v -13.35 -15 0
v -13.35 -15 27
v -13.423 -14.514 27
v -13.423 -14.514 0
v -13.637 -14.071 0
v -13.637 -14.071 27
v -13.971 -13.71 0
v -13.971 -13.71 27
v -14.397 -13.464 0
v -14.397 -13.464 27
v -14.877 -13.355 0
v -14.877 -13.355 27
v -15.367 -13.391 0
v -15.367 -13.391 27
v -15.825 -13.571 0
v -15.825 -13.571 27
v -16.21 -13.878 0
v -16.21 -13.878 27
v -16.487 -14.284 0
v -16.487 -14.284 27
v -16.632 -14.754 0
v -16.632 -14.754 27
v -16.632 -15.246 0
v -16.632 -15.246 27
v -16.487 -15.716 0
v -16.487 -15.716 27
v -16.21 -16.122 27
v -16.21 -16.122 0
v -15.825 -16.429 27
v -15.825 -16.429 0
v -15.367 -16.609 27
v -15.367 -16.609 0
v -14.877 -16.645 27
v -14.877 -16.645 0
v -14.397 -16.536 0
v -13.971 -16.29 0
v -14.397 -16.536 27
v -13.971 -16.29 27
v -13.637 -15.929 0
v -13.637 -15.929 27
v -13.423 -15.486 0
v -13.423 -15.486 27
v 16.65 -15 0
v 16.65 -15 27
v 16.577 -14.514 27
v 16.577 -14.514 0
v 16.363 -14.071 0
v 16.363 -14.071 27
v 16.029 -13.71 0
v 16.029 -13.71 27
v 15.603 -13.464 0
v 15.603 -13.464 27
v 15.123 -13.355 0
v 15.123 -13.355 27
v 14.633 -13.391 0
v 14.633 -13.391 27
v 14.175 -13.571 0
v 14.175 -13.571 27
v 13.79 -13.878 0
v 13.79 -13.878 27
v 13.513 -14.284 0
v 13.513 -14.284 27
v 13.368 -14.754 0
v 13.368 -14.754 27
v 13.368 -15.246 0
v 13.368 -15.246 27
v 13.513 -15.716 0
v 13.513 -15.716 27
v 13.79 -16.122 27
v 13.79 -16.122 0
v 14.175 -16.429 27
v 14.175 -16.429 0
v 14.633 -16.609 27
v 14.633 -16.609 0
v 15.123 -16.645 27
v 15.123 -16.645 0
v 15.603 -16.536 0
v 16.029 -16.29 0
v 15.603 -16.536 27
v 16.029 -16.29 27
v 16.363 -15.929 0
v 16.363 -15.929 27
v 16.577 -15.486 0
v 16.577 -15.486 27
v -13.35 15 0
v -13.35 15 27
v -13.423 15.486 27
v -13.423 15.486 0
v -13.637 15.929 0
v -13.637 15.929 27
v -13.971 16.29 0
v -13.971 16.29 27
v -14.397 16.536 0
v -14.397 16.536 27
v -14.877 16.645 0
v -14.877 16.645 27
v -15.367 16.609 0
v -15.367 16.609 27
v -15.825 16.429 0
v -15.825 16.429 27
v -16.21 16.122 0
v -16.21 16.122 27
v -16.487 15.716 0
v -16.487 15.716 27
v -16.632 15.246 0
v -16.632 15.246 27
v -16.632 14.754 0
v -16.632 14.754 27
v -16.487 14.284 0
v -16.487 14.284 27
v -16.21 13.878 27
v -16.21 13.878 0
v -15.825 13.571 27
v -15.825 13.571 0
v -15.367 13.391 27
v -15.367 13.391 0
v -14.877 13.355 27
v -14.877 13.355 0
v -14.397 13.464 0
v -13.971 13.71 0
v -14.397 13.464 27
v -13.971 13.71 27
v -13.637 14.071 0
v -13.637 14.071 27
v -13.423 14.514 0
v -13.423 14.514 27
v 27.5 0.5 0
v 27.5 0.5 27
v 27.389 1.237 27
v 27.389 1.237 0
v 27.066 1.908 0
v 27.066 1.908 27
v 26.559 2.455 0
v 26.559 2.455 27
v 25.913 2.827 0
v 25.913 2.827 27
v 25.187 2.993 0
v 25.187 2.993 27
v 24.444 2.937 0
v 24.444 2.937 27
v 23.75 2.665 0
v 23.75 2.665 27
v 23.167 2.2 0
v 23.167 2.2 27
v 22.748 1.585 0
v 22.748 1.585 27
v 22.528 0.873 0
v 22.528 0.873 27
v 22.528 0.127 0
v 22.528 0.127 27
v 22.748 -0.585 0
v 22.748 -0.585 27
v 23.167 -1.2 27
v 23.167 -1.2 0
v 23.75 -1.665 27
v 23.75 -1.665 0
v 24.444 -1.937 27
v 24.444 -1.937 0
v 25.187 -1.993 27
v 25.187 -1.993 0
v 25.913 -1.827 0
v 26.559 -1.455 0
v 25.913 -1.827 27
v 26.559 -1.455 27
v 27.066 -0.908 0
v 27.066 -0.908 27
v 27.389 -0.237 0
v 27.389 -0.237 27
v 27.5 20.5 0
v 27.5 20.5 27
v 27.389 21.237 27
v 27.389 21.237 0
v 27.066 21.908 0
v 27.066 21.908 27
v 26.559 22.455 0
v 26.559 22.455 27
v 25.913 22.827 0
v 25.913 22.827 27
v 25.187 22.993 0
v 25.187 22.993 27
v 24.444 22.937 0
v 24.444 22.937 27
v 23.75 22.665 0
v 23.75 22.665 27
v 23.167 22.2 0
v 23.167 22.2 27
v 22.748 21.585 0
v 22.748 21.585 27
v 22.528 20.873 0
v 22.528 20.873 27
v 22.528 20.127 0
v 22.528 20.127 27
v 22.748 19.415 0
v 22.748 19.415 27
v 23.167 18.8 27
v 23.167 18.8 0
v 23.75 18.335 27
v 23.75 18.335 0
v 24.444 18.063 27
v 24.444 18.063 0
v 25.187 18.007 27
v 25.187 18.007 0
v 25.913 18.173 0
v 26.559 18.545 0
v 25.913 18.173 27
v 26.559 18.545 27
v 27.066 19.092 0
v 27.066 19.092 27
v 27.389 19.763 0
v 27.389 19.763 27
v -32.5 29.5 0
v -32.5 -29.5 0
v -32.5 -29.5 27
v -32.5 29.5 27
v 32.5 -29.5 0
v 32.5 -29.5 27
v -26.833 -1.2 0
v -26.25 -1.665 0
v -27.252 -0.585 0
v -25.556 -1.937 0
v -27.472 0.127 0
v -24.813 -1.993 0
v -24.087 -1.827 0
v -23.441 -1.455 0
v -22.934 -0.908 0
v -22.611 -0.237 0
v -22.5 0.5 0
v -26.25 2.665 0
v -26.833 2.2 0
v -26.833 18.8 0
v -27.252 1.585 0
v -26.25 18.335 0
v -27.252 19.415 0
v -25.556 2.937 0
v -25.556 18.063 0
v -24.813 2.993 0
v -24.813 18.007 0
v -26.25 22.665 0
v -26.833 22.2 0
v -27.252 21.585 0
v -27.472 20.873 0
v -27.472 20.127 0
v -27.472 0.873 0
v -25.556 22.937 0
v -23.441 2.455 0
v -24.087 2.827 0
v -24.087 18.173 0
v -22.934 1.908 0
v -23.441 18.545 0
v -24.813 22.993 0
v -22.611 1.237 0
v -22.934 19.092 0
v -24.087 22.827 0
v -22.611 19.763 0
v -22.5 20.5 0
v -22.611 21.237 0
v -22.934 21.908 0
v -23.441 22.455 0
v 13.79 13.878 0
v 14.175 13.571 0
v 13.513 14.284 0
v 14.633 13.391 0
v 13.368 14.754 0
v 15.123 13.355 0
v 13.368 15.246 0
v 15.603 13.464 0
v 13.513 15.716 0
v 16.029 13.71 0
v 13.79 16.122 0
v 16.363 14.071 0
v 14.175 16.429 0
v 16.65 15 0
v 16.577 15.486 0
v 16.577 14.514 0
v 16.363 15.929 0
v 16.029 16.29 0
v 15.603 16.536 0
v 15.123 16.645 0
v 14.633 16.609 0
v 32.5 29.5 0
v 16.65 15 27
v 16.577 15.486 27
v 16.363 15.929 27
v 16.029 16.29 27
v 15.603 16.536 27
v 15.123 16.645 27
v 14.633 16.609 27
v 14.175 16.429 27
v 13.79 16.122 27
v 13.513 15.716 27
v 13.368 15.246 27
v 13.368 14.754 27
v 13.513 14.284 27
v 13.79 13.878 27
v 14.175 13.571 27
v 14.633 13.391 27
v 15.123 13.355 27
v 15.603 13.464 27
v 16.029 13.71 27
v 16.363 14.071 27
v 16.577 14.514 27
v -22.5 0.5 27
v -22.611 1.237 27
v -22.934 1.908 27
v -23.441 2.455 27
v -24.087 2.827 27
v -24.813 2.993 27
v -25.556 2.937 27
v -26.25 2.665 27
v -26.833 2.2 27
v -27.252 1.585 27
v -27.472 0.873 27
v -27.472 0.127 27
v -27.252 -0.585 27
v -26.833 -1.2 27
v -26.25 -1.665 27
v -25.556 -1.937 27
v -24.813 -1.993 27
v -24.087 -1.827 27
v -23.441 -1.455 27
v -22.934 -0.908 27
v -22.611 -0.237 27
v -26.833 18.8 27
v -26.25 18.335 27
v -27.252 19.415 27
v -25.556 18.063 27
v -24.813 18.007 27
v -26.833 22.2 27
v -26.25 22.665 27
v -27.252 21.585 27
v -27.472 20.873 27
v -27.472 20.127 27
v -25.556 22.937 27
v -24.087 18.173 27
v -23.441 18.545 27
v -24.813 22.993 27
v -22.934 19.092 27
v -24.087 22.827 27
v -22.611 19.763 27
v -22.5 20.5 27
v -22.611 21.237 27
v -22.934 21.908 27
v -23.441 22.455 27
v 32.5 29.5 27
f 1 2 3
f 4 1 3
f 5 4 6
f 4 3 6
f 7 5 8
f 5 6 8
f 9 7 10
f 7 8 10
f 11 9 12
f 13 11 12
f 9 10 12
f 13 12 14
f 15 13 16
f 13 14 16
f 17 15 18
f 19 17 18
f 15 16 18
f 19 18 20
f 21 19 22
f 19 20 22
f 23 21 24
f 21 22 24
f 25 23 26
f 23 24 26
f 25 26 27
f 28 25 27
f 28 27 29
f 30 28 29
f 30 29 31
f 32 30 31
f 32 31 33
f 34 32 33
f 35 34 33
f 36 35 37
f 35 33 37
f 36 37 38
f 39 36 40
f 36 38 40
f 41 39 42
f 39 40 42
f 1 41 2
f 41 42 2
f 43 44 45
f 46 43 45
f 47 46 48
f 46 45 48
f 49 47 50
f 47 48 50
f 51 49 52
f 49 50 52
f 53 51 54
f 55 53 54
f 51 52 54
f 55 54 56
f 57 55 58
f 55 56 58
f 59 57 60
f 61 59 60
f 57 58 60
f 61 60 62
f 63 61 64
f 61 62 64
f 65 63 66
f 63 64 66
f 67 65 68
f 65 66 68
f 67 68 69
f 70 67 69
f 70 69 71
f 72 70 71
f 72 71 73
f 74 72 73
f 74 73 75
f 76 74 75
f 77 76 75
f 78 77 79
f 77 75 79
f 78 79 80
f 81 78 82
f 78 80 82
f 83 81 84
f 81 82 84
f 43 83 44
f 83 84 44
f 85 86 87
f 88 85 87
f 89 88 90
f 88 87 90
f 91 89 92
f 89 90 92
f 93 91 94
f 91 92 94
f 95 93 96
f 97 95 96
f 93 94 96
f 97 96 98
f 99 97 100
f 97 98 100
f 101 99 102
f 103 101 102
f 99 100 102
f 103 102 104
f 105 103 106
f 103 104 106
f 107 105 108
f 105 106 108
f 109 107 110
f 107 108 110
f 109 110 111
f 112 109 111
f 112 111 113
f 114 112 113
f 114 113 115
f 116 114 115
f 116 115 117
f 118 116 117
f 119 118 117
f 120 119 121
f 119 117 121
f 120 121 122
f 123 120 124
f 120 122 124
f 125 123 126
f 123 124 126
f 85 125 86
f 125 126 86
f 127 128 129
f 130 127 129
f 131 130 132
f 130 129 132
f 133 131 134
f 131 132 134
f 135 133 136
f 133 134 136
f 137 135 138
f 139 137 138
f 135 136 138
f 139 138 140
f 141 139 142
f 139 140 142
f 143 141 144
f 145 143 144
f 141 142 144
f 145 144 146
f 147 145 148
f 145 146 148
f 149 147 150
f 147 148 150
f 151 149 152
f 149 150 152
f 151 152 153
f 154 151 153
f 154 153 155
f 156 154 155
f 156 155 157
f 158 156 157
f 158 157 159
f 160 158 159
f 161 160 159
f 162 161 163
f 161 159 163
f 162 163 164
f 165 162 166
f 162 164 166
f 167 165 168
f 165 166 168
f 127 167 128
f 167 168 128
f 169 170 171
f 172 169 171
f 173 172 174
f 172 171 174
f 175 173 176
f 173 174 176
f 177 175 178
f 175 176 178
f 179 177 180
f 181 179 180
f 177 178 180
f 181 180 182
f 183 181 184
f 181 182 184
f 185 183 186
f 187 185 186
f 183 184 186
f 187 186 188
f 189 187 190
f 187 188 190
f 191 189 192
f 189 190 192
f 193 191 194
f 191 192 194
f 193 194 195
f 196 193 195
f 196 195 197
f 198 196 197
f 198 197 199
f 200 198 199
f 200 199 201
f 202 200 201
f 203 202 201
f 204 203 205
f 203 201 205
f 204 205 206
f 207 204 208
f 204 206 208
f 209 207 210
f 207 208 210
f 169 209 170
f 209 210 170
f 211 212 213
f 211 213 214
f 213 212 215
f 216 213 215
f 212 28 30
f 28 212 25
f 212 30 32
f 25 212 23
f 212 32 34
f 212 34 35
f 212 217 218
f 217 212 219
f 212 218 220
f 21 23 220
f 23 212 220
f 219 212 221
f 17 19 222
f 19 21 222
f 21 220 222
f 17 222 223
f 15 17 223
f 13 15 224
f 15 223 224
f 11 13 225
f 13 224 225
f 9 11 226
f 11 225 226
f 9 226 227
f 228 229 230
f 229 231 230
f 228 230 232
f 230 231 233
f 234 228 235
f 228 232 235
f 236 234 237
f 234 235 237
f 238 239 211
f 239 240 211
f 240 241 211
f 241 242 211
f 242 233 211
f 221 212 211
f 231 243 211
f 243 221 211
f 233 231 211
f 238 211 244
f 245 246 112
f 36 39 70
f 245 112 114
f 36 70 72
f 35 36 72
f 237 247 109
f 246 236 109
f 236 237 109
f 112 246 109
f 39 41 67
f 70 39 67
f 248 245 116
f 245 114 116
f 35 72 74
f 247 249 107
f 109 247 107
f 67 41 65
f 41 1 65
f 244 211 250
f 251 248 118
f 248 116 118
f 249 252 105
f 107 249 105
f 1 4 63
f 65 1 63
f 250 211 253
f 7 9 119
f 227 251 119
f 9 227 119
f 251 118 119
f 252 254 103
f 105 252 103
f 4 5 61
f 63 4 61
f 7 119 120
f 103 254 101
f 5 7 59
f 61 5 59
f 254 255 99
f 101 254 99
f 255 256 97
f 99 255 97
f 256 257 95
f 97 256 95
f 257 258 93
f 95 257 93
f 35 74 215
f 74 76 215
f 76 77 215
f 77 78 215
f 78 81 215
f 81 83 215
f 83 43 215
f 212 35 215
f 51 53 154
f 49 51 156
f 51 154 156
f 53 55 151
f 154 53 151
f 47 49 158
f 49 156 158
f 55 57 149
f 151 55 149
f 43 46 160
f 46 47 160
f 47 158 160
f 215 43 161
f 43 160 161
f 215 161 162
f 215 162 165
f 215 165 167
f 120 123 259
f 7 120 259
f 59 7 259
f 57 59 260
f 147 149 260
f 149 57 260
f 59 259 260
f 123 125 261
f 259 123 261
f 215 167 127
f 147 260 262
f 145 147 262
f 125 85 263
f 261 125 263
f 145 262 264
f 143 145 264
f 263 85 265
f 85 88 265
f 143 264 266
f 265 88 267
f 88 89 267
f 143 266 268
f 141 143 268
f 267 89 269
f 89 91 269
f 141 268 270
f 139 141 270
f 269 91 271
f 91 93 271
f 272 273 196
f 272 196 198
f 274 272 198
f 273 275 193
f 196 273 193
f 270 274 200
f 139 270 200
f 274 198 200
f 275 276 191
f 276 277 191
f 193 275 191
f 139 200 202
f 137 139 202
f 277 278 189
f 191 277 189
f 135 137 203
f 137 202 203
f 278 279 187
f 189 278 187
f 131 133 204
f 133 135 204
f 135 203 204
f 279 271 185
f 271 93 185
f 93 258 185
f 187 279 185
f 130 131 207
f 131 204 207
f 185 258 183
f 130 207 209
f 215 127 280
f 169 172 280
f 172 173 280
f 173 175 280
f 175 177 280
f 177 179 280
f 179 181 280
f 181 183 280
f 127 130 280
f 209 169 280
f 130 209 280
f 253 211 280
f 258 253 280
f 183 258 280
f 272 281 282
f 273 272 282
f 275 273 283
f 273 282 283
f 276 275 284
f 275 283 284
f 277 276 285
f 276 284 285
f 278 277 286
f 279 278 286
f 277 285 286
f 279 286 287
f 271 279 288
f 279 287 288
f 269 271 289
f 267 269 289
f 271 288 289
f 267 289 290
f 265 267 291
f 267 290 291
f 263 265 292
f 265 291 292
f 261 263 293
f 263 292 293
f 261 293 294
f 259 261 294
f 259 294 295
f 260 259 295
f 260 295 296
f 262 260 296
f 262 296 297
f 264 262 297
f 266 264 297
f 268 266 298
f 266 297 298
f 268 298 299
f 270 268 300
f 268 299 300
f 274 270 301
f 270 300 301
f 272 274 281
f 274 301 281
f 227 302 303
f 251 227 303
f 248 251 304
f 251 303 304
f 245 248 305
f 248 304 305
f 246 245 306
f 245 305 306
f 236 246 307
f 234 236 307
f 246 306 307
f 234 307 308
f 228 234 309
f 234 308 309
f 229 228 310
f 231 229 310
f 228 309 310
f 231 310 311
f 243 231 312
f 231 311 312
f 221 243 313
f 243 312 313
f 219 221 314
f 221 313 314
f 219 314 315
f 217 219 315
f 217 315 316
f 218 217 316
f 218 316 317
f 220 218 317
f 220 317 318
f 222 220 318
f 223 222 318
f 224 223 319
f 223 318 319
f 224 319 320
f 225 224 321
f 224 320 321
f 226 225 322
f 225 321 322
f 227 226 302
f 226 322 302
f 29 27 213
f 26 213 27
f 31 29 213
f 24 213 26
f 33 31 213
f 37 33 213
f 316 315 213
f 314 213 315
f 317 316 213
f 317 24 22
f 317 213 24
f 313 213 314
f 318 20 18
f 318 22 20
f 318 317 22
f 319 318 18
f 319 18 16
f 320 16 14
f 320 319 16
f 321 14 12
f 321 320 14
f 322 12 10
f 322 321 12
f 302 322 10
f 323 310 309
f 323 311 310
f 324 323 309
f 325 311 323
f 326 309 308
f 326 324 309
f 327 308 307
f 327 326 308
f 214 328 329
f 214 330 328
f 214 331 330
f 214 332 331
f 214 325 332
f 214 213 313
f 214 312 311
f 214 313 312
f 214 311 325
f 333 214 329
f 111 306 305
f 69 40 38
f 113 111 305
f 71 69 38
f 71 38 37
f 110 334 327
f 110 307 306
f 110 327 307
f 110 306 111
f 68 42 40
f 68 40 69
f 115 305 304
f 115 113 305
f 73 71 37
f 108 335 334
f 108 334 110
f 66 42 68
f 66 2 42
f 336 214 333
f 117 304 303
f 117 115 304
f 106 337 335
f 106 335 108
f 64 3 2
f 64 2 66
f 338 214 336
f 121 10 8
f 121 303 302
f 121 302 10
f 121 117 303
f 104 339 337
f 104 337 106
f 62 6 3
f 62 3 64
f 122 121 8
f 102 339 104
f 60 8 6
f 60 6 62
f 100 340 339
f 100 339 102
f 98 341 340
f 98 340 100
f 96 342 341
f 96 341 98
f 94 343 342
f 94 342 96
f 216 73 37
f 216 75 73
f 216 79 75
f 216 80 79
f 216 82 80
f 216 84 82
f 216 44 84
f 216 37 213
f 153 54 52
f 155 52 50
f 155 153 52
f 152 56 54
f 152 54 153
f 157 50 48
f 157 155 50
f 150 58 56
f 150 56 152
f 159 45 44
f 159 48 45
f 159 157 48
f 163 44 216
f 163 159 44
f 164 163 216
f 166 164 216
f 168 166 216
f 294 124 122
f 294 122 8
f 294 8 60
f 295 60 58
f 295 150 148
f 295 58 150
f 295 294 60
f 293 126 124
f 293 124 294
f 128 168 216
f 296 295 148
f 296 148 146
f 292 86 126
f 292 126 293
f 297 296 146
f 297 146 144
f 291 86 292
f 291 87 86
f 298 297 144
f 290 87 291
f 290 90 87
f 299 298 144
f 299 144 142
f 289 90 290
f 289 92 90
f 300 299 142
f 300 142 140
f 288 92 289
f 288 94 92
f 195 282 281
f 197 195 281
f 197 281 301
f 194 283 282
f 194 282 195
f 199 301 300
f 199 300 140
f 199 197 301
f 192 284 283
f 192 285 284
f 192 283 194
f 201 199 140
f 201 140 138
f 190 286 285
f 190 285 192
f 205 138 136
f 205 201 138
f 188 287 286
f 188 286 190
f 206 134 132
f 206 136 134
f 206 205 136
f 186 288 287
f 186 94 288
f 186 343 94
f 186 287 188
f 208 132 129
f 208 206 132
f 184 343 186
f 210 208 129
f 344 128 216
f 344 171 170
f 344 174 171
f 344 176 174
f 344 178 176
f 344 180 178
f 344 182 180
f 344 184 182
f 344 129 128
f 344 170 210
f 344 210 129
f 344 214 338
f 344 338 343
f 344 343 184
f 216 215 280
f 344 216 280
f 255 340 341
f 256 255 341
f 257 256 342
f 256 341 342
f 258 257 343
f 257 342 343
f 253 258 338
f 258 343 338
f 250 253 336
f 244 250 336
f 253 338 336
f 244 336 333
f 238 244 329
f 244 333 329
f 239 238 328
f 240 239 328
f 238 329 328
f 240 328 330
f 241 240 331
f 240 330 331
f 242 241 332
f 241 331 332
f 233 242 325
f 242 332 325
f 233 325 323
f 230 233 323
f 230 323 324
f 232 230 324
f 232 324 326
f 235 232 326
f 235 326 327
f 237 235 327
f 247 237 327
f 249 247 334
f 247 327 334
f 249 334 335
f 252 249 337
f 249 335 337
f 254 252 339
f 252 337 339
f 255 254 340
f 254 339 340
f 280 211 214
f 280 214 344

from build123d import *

# Parameters (mm, degrees)
SKETCH_1_W                  = 65
SKETCH_1_H                  = 59
EXTRUDE_1_DEPTH             = 27
SKETCH_2_R                  = 2.5
CUT_EXTRUDE_1_DEPTH         = 27
PATTERN_LINEAR_1_COUNT      = 2
PATTERN_LINEAR_1_PITCH      = 50
PATTERN_LINEAR_1_COUNT_DIR2 = 2
PATTERN_LINEAR_1_PITCH_DIR2 = 20
SKETCH_3_R                  = 1.65
CUT_EXTRUDE_2_DEPTH         = 27
PATTERN_LINEAR_2_COUNT      = 2
PATTERN_LINEAR_2_PITCH      = 30
PATTERN_LINEAR_2_COUNT_DIR2 = 2
PATTERN_LINEAR_2_PITCH_DIR2 = 30


with BuildPart() as part:
    # Эскиз1 → Бобышка-Вытянуть1 (new body)
    with BuildSketch(Plane.XY):
        Rectangle(SKETCH_1_W, SKETCH_1_H)
    extrude(amount=EXTRUDE_1_DEPTH)

    # Эскиз2 → Вырез-Вытянуть1 (cut)
    with BuildSketch(Plane.XY.offset(27)):
        with Locations((-25, 20.5)):
            Circle(SKETCH_2_R)
    cut_extrude_1 = extrude(amount=-CUT_EXTRUDE_1_DEPTH, mode=Mode.SUBTRACT)

    # Линейный массив1: Cut-Extrude 1 2 × 2
    with Locations(*[(i * PATTERN_LINEAR_1_PITCH, -j * PATTERN_LINEAR_1_PITCH_DIR2, 0) for i in range(PATTERN_LINEAR_1_COUNT) for j in range(PATTERN_LINEAR_1_COUNT_DIR2) if (i, j) != (0, 0)]):
        add(cut_extrude_1, mode=Mode.SUBTRACT)

    # Эскиз3 → Вырез-Вытянуть2 (cut)
    with BuildSketch(Plane.XY.offset(27)):
        with Locations((-15, 15)):
            Circle(SKETCH_3_R)
    cut_extrude_2 = extrude(amount=-CUT_EXTRUDE_2_DEPTH, mode=Mode.SUBTRACT)

    # Линейный массив2: Cut-Extrude 2 2 × 2
    with Locations(*[(i * PATTERN_LINEAR_2_PITCH, -j * PATTERN_LINEAR_2_PITCH_DIR2, 0) for i in range(PATTERN_LINEAR_2_COUNT) for j in range(PATTERN_LINEAR_2_COUNT_DIR2) if (i, j) != (0, 0)]):
        add(cut_extrude_2, mode=Mode.SUBTRACT)


solid = part.part
